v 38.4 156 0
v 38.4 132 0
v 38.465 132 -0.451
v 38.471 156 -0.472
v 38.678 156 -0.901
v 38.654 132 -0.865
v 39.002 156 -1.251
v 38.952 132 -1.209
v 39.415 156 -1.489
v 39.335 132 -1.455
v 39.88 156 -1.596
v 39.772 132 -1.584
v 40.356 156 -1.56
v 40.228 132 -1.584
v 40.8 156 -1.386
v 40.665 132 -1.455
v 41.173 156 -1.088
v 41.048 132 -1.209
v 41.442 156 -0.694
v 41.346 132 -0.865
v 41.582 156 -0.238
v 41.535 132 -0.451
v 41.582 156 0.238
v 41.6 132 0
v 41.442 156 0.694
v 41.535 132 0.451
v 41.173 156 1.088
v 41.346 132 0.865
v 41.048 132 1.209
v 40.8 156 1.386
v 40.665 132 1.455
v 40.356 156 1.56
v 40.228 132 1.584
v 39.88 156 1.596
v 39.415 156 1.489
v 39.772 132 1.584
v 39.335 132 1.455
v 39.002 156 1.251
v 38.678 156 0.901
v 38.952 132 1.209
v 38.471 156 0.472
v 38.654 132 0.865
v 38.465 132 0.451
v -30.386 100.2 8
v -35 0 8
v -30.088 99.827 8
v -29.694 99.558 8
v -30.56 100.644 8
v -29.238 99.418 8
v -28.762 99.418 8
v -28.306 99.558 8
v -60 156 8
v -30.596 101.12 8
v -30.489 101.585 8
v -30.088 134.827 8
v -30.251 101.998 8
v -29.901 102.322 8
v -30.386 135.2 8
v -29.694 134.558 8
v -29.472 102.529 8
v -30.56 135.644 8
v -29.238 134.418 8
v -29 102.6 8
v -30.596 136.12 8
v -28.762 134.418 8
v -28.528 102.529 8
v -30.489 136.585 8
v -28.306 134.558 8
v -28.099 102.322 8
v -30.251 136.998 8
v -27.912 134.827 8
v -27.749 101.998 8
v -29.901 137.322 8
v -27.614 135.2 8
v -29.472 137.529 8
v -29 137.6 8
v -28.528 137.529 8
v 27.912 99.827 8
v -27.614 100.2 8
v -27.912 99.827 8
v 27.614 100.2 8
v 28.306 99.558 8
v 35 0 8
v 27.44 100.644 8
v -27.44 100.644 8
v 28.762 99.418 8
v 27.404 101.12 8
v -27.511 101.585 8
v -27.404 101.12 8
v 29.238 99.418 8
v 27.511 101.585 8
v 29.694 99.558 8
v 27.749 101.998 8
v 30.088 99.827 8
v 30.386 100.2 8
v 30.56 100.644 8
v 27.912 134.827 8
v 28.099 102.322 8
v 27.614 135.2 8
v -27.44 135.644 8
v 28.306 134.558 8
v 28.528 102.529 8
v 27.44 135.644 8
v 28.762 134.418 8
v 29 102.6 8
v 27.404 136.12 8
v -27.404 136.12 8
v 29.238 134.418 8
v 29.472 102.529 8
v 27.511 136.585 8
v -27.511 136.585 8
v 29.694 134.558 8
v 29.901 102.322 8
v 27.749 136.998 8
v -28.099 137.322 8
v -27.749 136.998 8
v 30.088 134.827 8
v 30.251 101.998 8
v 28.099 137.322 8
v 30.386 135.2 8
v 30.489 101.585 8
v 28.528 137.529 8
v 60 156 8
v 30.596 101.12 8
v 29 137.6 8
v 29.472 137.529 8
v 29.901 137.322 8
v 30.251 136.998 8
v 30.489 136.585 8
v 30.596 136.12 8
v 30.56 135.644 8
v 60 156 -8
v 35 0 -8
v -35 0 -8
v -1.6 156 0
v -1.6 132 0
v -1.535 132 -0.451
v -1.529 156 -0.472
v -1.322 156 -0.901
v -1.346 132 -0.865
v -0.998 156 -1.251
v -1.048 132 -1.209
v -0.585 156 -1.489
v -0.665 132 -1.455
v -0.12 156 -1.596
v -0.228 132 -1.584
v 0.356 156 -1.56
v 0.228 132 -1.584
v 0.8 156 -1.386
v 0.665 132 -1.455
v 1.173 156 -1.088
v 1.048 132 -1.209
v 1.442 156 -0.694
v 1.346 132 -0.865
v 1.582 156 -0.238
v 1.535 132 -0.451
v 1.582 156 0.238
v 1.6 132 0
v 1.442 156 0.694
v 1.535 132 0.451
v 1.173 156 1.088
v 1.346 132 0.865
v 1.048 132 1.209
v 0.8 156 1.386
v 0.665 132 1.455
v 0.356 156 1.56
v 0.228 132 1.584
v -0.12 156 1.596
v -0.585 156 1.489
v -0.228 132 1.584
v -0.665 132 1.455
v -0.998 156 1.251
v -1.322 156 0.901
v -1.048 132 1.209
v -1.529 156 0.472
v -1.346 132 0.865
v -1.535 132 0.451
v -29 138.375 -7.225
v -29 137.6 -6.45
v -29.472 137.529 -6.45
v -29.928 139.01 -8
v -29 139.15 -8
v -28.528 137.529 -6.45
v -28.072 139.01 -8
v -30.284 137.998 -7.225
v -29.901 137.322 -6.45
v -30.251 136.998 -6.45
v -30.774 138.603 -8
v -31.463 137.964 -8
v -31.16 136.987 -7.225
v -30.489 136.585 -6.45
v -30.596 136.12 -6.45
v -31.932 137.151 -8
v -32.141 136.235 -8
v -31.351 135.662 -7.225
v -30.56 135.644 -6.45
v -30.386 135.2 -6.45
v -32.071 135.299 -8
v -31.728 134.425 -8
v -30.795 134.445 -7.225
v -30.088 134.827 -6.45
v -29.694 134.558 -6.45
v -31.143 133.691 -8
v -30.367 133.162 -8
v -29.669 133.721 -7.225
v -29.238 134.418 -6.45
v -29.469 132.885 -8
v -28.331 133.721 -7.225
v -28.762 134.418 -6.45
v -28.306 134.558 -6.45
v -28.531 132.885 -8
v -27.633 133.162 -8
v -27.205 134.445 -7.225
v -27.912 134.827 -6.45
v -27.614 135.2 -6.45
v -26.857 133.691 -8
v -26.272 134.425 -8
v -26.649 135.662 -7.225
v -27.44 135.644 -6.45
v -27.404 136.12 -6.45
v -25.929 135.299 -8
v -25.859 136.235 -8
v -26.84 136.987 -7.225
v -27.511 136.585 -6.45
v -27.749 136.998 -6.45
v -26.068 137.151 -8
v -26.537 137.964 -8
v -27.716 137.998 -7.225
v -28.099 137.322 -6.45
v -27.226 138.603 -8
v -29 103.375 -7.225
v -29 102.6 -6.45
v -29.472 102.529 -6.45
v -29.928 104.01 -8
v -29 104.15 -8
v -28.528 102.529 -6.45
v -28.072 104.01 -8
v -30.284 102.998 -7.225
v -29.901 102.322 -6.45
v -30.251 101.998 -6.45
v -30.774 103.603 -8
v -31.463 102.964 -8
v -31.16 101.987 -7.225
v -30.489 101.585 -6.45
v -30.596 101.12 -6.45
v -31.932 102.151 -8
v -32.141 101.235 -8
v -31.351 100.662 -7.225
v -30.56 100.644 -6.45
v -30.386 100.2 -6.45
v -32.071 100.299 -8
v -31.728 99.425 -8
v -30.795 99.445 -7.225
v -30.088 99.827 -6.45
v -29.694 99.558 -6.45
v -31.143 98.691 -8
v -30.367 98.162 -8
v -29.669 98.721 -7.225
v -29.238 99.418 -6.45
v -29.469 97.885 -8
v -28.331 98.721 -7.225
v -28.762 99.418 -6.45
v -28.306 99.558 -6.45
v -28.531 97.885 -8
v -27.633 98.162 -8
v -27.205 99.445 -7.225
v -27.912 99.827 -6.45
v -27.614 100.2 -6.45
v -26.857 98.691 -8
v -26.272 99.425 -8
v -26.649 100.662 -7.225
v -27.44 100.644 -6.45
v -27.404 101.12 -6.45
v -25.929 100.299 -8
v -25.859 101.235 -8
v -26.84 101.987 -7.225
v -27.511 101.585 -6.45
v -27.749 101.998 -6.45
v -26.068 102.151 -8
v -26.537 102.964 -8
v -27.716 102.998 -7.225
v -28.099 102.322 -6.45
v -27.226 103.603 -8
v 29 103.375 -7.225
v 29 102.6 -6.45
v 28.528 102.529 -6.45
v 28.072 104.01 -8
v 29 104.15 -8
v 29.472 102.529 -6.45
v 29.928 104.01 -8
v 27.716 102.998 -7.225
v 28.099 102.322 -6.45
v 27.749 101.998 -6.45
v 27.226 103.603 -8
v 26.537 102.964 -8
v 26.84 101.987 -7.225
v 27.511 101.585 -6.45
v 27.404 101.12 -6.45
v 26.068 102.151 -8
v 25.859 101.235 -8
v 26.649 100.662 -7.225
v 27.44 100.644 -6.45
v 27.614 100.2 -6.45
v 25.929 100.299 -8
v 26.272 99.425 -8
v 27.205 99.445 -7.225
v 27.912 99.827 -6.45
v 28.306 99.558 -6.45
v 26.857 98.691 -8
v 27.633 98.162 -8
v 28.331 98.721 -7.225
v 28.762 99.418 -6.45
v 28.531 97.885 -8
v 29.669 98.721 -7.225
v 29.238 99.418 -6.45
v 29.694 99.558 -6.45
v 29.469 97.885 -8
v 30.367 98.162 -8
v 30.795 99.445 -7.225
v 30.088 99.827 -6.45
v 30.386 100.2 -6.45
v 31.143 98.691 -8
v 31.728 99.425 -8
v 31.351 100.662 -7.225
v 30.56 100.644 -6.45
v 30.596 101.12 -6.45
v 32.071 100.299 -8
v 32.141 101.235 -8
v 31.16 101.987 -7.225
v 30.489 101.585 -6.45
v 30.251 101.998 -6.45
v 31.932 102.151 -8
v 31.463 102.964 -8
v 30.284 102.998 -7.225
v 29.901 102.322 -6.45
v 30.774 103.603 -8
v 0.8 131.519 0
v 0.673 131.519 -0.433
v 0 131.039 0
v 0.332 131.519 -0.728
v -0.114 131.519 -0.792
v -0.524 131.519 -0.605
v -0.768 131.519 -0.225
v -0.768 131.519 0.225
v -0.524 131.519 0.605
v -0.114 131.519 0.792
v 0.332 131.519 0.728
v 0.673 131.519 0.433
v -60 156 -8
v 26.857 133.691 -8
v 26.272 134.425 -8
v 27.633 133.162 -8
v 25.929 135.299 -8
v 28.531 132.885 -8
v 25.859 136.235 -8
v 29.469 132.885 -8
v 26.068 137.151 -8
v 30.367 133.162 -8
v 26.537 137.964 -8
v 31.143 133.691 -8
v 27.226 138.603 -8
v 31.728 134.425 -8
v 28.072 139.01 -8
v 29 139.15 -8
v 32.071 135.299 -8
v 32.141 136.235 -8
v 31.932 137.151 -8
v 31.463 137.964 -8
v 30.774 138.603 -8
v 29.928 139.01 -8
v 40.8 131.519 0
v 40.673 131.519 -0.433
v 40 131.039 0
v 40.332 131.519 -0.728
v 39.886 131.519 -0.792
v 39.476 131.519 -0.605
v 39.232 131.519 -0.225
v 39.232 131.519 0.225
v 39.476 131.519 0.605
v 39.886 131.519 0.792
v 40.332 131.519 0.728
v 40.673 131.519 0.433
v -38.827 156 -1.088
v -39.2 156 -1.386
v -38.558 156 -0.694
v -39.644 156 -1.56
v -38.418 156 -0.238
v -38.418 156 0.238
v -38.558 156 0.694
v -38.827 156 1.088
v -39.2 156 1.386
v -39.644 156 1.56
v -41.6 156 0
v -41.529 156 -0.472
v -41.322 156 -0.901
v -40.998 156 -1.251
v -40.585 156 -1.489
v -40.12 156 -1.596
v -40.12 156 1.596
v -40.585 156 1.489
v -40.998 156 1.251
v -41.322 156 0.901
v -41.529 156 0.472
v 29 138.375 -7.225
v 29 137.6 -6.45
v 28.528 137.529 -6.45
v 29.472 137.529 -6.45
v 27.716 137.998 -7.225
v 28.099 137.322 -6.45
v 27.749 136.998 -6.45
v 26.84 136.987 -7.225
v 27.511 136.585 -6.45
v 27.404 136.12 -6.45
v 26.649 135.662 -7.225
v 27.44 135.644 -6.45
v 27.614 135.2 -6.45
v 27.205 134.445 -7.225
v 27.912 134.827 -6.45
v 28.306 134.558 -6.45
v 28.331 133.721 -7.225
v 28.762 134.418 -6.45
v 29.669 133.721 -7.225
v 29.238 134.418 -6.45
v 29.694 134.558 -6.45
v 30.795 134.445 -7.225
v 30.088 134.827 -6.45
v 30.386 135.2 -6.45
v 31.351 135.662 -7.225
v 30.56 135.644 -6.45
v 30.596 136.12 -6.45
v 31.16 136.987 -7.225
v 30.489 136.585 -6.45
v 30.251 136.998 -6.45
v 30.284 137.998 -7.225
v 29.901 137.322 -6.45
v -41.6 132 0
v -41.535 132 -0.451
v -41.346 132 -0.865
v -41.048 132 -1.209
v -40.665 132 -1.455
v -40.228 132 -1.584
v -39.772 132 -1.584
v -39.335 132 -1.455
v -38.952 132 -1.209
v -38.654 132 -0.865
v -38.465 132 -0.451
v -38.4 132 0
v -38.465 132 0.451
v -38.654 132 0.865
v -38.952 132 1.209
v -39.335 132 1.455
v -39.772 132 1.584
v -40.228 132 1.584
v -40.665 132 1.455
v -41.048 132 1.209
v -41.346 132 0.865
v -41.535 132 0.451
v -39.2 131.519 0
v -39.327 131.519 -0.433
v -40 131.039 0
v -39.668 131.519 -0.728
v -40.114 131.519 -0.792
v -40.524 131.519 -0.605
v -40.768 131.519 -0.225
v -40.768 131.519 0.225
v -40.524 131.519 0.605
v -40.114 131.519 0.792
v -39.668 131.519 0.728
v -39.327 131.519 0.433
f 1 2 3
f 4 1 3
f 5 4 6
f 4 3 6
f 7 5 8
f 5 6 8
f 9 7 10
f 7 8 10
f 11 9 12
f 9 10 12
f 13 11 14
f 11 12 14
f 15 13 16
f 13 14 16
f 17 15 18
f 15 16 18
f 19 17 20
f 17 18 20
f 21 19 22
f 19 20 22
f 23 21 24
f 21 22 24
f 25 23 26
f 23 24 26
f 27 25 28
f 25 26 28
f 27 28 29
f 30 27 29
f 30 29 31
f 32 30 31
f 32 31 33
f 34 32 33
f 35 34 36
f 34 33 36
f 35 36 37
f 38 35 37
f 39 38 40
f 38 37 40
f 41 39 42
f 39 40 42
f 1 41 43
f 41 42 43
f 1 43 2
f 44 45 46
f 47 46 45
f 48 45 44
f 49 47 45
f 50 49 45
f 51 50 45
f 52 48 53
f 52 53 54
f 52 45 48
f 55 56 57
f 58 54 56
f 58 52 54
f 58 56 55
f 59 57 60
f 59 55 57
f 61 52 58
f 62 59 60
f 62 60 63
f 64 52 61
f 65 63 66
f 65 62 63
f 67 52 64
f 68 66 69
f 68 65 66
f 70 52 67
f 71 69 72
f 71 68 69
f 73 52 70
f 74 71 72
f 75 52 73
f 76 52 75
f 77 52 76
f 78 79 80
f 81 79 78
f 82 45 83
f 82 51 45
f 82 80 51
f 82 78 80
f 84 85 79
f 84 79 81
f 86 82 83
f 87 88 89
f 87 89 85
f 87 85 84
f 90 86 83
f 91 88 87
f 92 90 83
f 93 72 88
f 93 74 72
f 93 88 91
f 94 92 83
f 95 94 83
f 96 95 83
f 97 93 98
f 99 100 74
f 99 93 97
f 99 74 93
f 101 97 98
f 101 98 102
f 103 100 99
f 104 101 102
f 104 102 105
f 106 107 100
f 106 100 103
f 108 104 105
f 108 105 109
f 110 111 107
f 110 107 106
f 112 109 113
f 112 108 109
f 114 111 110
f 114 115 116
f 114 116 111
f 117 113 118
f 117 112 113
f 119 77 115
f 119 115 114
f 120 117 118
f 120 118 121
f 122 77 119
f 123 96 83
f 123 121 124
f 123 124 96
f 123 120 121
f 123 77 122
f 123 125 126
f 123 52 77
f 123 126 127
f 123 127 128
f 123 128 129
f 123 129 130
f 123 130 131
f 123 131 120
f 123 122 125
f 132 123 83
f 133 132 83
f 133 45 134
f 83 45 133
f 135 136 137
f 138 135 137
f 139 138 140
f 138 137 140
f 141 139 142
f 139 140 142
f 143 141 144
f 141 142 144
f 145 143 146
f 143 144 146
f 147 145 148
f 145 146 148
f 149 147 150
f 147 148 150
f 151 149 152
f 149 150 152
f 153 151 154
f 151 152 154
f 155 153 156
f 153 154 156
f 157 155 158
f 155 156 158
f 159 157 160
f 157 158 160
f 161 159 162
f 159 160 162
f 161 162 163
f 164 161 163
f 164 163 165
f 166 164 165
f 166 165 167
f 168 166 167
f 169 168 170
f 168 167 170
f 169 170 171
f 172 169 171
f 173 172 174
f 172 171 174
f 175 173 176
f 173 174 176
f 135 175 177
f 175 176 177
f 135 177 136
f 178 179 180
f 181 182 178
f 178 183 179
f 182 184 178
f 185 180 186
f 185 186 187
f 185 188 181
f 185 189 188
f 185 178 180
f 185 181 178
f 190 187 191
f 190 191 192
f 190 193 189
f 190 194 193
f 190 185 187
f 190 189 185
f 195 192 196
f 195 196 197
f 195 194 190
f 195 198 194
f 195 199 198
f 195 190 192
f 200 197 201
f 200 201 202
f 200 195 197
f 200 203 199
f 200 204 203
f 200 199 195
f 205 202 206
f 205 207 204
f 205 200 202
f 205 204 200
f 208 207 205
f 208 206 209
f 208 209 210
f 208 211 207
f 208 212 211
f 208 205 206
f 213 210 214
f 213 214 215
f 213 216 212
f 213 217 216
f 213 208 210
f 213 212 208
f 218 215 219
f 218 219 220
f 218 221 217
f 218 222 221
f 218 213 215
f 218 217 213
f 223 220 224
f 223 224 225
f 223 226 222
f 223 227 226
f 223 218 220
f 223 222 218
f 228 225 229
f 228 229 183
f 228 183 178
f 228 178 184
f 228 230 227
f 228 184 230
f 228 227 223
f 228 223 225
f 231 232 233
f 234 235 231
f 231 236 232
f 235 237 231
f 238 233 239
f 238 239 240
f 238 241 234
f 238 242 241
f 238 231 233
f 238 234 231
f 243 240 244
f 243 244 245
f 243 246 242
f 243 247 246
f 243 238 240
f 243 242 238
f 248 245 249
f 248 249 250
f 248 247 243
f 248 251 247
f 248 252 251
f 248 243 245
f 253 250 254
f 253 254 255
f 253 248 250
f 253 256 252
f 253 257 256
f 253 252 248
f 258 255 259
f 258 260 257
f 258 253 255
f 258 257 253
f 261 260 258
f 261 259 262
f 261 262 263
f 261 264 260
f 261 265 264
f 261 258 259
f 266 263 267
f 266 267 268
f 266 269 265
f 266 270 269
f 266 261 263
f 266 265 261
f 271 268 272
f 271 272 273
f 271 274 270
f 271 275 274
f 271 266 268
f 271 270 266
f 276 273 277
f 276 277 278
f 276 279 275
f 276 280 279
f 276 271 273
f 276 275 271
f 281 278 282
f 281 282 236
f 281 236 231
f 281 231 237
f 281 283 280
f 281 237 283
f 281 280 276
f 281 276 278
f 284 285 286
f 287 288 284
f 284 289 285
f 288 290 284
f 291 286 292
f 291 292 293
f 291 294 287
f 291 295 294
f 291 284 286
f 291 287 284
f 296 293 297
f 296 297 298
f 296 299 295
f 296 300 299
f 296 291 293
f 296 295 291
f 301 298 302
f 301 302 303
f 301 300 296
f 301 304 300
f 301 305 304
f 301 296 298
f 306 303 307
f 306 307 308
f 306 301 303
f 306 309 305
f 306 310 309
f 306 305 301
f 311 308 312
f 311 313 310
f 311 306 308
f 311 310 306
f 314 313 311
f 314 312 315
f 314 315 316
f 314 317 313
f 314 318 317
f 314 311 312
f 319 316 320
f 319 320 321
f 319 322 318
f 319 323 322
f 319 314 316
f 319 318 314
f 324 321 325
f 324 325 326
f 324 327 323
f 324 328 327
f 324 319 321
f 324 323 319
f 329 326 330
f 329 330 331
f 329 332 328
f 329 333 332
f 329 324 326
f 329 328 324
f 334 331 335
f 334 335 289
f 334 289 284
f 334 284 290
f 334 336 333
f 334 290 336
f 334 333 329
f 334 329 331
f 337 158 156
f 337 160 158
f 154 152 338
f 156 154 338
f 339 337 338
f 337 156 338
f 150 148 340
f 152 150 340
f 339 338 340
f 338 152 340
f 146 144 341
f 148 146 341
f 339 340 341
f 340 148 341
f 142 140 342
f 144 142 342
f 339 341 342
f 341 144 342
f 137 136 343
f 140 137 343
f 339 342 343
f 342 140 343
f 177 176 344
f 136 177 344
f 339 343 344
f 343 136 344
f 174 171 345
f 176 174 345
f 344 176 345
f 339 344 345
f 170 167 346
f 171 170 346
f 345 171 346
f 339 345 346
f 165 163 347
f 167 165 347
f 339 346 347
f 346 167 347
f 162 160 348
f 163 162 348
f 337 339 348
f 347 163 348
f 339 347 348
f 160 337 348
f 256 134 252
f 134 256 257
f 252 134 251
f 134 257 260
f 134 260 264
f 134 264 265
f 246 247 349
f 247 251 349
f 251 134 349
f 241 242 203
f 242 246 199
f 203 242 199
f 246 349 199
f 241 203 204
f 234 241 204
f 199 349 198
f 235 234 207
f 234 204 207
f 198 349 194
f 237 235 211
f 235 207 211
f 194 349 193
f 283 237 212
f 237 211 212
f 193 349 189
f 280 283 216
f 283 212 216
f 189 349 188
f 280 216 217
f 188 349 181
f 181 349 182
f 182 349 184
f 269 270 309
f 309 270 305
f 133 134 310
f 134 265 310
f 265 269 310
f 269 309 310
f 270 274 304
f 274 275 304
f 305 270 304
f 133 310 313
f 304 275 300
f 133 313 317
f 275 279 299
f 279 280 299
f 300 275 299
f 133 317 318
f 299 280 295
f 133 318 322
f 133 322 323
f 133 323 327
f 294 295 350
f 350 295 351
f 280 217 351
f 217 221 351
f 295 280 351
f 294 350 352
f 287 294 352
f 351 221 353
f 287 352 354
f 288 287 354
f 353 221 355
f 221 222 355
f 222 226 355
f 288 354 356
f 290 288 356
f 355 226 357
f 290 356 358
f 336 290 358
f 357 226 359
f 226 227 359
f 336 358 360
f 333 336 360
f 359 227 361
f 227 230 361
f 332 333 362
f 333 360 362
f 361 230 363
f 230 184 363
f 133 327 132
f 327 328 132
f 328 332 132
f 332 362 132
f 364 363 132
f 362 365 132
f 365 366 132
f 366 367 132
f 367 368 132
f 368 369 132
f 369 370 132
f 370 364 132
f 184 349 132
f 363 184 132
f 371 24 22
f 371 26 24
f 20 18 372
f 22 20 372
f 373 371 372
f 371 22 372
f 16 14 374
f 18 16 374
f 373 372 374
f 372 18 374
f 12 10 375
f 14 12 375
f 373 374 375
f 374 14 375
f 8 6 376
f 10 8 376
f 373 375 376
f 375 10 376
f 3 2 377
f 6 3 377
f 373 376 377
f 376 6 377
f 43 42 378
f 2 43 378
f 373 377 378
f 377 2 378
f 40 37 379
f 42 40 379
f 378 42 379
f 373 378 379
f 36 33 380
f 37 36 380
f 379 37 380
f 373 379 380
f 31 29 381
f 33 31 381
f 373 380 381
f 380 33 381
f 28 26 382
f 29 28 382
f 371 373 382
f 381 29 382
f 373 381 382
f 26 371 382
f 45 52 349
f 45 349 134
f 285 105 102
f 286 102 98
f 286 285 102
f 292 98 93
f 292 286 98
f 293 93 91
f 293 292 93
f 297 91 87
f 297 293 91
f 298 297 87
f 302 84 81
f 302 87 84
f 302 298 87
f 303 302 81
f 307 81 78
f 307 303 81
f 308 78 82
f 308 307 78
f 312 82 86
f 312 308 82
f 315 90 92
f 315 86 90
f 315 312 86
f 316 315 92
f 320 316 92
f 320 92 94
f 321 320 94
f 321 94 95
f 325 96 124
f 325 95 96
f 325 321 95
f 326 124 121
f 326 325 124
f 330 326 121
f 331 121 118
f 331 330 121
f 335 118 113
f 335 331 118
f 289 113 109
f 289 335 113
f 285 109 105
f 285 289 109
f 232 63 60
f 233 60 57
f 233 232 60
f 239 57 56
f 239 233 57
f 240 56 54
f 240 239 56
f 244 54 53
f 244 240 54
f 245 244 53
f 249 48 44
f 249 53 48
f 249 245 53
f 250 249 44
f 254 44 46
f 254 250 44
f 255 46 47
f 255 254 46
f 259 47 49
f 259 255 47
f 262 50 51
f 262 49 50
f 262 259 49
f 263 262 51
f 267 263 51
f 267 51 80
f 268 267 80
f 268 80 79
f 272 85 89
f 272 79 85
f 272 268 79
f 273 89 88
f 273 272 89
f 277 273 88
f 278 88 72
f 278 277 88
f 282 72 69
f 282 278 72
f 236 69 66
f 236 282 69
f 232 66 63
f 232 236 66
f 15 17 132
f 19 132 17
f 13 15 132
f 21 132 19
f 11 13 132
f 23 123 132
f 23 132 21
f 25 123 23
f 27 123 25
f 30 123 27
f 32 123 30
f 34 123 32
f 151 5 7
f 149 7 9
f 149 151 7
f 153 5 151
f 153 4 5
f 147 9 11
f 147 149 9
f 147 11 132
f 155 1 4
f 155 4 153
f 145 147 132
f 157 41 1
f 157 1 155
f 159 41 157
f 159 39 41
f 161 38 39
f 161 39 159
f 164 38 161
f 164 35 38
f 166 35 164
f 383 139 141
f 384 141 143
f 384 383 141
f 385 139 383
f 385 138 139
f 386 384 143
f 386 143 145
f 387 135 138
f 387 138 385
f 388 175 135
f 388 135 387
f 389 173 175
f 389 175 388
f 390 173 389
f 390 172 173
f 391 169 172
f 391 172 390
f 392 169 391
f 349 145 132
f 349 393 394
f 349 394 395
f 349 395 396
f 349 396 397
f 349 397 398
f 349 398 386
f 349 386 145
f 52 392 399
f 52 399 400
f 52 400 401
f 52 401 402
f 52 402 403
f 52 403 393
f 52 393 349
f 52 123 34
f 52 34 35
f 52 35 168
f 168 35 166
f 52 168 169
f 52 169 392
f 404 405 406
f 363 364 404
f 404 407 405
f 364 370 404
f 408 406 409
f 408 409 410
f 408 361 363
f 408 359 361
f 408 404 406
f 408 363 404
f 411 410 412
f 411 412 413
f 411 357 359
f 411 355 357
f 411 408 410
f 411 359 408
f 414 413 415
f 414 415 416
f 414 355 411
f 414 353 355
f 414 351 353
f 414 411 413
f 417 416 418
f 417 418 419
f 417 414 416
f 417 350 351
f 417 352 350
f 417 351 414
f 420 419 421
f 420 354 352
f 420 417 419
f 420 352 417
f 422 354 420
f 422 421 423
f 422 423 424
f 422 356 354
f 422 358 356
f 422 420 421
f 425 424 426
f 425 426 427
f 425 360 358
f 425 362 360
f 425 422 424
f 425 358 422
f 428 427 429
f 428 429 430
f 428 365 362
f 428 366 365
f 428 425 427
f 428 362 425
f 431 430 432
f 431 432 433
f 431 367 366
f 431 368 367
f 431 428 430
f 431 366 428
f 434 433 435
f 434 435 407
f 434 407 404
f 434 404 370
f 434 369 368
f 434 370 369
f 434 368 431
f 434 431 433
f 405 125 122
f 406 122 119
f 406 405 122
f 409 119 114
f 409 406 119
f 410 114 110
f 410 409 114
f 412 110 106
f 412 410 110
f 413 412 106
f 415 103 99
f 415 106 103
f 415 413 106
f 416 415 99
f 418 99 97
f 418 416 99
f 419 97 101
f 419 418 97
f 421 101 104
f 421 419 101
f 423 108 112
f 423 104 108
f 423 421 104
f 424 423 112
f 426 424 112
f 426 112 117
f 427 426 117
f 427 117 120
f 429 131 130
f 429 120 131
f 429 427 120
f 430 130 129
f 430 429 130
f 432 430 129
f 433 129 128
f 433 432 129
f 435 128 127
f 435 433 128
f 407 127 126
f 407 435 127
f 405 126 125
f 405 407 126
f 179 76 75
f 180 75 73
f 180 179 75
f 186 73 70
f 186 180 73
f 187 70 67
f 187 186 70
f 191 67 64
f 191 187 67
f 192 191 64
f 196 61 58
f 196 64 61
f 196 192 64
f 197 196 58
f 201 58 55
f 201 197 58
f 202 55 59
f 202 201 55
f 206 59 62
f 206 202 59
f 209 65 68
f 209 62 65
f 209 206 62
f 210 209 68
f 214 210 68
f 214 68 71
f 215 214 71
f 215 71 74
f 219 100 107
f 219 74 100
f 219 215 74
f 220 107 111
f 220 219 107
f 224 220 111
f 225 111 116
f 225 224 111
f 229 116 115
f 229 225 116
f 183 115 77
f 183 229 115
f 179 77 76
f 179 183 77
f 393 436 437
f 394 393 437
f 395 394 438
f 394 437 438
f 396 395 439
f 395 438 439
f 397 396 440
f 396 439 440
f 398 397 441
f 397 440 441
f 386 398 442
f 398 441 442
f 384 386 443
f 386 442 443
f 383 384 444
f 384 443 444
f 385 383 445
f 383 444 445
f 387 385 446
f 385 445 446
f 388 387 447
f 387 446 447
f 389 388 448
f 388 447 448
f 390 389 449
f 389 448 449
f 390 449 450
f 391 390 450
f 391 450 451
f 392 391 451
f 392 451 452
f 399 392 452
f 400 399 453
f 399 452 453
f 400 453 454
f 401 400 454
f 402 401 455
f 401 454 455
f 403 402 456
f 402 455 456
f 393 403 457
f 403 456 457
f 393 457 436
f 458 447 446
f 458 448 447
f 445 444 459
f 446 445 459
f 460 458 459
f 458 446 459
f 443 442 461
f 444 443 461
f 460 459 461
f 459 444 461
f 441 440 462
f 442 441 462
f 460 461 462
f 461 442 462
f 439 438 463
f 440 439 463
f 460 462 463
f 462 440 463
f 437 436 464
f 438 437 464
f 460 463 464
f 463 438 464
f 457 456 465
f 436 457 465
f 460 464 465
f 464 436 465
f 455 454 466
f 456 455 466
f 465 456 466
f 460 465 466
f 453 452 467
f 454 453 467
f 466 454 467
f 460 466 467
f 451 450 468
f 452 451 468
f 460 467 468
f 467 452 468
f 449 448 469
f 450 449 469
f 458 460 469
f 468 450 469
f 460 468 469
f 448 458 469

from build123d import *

# Parameters (mm, degrees)
DODANIE_WYCI_GNI_CIE1_DEPTH                       = 8
POG_BIENIE_STO_KOWE_POD_M3_WKR_T_DO_2_COUNT       = 2
POG_BIENIE_STO_KOWE_POD_M3_WKR_T_DO_2_PITCH       = 35
SZYK_LINIOWY2_COUNT                               = 2
SZYK_LINIOWY2_PITCH                               = 58
POG_BIENIE_STO_KOWE_POD_M3_WKR_T_DO_3_D           = 3.2
POG_BIENIE_STO_KOWE_POD_M3_WKR_T_DO_3_DEPTH       = 40
POG_BIENIE_STO_KOWE_POD_M3_WKR_T_DO_3_CSINK_D     = 6.3
POG_BIENIE_STO_KOWE_POD_M3_WKR_T_DO_3_CSINK_ANGLE = 90
POG_BIENIE_STO_KOWE_POD_M3_WKR_T_DO_3_TIP         = 0.96137699


with BuildPart() as part:
    # Szkic1 → Dodanie-wyciągnięcie1 (new, symmetric)
    with BuildSketch(Plane.XY):
        Polygon((35, 0), (0, 0), (0, 156), (60, 156), align=None)
    dodanie_wyci_gni_cie1 = extrude(amount=DODANIE_WYCI_GNI_CIE1_DEPTH, both=True)

    # Lustro1: Dodanie-wyciągnięcie1 across plane
    add(dodanie_wyci_gni_cie1.mirror(Plane(origin=(0, 0, 8), x_dir=(0, 0, 1), z_dir=(1, 0, 0))))

    # Szkic5 → Pog_bienie sto_kowe pod M3 wkr_t do cz_c (revolve, cut)
    with BuildSketch(Plane(origin=(29, 101, -8), x_dir=(0, 1, 0), z_dir=(1, 0, 0))):
        Polygon((0, 0), (0, 40.96137699), (1.6, 40), (1.6, 1.55), (3.15, 0), align=None)
    pog_bienie_sto_kowe_pod_m3_wkr_t_do_cz_c = revolve(axis=Axis((29, 101, -14.35), (0, 0, 1)), mode=Mode.SUBTRACT)

    # Pog_bienie sto_kowe pod M3 wkr_t do  2: Pog_bienie sto_kowe pod M3 wkr_t do cz_c ×2
    with Locations(*[(0, i * POG_BIENIE_STO_KOWE_POD_M3_WKR_T_DO_2_PITCH, 0) for i in range(1, POG_BIENIE_STO_KOWE_POD_M3_WKR_T_DO_2_COUNT)]):
        add(pog_bienie_sto_kowe_pod_m3_wkr_t_do_cz_c, mode=Mode.SUBTRACT)

    # Szyk liniowy2: Pog_bienie sto_kowe pod M3 wkr_t do cz_c ×2
    with Locations(*[(-i * SZYK_LINIOWY2_PITCH, 0, 0) for i in range(1, SZYK_LINIOWY2_COUNT)]):
        add(pog_bienie_sto_kowe_pod_m3_wkr_t_do_cz_c, mode=Mode.SUBTRACT)

    # Szyk liniowy2 copy 1 sketch → Szyk liniowy2 copy 1 (revolve, cut)
    with BuildSketch(Plane(origin=(-29, 136, -8), x_dir=(0, 1, 0), z_dir=(1, 0, 0))):
        Polygon((0, 0), (0, 40.96137699), (1.6, 40), (1.6, 1.55), (3.15, 0), align=None)
    revolve(axis=Axis((-29, 136, -14.35), (0, 0, 1)), mode=Mode.SUBTRACT)

    # Pog_bienie sto_kowe pod M3 wkr_t do  3
    with Locations(Plane(origin=(-255, 172, 61), x_dir=(1, 0, 0), z_dir=(0, 1, 0))):
        with Locations((295, 61), (284, 28), (226, 28), (226, 48), (255, 61), (215, 61), (284, 48)):
            CounterSinkHole(POG_BIENIE_STO_KOWE_POD_M3_WKR_T_DO_3_D / 2, POG_BIENIE_STO_KOWE_POD_M3_WKR_T_DO_3_CSINK_D / 2, depth=POG_BIENIE_STO_KOWE_POD_M3_WKR_T_DO_3_DEPTH, counter_sink_angle=POG_BIENIE_STO_KOWE_POD_M3_WKR_T_DO_3_CSINK_ANGLE)
            with Locations((0, 0, -(POG_BIENIE_STO_KOWE_POD_M3_WKR_T_DO_3_DEPTH + POG_BIENIE_STO_KOWE_POD_M3_WKR_T_DO_3_TIP / 2))):  # 118° drill point
                Cone(0, POG_BIENIE_STO_KOWE_POD_M3_WKR_T_DO_3_D / 2, POG_BIENIE_STO_KOWE_POD_M3_WKR_T_DO_3_TIP, mode=Mode.SUBTRACT)


solid = part.part
